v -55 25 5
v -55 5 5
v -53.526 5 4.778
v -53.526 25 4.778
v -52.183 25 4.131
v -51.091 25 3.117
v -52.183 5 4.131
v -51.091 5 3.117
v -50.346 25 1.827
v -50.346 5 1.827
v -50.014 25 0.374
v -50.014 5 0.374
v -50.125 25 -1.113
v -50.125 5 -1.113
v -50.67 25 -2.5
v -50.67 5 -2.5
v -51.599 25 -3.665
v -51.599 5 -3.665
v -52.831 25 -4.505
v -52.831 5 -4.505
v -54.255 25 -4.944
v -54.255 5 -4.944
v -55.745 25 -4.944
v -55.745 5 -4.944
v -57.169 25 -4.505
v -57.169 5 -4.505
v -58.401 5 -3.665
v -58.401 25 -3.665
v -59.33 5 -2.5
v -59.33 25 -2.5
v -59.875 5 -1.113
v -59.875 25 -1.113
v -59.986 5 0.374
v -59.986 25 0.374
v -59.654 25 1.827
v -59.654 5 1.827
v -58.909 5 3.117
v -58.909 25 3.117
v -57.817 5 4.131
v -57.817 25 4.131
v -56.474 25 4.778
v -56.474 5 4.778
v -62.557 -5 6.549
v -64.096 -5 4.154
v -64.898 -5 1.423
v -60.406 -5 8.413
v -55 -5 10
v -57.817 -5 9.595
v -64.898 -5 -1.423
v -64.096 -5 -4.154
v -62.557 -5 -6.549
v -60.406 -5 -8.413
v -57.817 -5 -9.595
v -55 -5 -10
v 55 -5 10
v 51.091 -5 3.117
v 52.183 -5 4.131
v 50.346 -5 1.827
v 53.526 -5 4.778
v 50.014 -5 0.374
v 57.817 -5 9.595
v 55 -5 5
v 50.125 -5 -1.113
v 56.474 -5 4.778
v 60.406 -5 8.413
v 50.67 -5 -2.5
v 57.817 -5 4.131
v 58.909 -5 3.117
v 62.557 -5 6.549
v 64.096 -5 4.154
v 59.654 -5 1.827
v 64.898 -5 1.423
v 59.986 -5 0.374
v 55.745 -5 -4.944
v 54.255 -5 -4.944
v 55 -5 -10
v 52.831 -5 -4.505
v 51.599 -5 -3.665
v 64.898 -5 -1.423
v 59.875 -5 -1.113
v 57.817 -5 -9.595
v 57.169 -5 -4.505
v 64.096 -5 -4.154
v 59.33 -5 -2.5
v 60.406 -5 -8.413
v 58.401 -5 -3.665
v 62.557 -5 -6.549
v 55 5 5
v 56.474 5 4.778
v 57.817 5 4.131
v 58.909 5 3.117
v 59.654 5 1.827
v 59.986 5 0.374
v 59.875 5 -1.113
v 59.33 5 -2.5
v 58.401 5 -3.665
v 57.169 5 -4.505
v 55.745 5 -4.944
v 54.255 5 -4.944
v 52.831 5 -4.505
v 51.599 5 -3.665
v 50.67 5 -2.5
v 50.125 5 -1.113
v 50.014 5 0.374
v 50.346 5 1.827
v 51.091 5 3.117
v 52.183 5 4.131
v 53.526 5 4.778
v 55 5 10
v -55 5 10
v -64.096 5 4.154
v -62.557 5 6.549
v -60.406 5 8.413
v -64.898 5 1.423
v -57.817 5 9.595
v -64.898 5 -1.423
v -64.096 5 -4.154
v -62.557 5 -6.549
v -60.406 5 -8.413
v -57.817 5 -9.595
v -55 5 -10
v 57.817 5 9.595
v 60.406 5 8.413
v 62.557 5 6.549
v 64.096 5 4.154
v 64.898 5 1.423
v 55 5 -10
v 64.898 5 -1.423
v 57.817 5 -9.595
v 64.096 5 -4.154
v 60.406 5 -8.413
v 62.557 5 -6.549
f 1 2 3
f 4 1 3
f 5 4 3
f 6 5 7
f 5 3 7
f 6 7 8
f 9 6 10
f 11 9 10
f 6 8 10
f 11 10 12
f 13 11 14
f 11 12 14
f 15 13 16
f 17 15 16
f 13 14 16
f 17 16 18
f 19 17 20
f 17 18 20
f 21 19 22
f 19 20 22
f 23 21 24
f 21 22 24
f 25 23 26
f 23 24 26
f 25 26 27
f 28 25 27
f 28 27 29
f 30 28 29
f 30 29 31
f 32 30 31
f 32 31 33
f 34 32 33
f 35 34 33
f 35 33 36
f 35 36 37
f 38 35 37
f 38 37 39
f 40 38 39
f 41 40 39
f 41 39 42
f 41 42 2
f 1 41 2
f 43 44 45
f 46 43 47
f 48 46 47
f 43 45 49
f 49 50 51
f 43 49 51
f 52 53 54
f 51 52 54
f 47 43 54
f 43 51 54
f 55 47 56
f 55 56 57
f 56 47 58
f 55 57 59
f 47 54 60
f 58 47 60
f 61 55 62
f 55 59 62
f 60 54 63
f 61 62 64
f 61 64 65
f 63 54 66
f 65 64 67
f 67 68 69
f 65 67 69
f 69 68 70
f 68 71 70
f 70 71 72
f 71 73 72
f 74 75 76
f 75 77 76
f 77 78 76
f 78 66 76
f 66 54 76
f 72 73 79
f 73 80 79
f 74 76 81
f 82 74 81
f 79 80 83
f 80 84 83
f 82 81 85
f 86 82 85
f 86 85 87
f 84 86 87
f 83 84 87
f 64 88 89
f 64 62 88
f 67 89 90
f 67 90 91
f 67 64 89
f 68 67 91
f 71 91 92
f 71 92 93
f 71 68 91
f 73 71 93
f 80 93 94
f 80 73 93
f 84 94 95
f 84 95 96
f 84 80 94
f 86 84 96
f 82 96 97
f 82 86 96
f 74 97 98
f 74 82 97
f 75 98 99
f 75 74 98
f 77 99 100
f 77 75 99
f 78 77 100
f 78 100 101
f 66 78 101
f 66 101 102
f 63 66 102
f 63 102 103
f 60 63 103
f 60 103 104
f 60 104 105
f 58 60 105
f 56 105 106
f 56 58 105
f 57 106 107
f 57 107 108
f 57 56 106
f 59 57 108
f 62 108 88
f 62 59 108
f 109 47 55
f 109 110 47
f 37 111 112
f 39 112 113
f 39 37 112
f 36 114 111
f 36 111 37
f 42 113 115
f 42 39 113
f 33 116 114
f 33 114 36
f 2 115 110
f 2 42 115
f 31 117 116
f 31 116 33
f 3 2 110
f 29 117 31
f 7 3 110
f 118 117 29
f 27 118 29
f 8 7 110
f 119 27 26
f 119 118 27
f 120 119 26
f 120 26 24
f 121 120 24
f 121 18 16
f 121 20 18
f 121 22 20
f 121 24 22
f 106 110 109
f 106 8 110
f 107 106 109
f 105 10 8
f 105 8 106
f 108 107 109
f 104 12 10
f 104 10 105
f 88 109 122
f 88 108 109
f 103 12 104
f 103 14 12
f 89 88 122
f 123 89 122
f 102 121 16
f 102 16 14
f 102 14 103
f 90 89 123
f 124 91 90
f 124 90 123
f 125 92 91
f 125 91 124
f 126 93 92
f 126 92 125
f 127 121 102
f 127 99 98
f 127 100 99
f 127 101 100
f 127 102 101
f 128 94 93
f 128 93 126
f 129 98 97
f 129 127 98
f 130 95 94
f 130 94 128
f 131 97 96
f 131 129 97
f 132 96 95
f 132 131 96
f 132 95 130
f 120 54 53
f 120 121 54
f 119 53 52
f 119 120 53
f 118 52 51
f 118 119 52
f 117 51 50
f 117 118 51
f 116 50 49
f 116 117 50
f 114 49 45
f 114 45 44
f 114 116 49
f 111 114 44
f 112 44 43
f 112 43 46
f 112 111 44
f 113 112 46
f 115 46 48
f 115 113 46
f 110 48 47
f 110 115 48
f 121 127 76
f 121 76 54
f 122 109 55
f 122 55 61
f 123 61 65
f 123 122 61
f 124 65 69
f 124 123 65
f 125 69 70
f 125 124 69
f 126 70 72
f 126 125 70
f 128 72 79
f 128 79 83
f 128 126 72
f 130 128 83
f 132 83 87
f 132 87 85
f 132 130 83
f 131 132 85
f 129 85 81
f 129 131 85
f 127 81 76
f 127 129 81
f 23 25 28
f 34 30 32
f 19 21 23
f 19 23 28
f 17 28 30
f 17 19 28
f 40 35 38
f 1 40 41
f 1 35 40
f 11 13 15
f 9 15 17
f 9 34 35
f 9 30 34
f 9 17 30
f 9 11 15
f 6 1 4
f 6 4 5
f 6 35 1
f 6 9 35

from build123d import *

# Parameters (mm, degrees)
SKETCH1_R                = 5
BOSS_EXTRUDE1_DEPTH      = 5
BOSS_EXTRUDE2_DEPTH      = 25
BOSS_EXTRUDE2_DEPTH_BACK = 5
SKETCH2_R                = 5


with BuildPart() as part:
    # Sketch1 → Boss-Extrude1 (new, symmetric)
    with BuildSketch(Plane(origin=(0, 0, 0), x_dir=(1, 0, 0), z_dir=(0, 1, 0))):
        with BuildLine():
            Line((-55, -10), (55, -10))
            ThreePointArc((55, -10), (65, 0), (55, 10))
            Line((55, 10), (-55, 10))
            ThreePointArc((-55, 10), (-65, 0), (-55, -10))
        make_face()
        with Locations(Location((-55, 0, 0), (0, 0, 270))):
            Circle(SKETCH1_R, mode=Mode.SUBTRACT)
        with Locations(Location((55, 0, 0), (0, 0, 270))):
            Circle(SKETCH1_R, mode=Mode.SUBTRACT)
    extrude(amount=BOSS_EXTRUDE1_DEPTH, both=True)

    # Sketch2 → Boss-Extrude2 (add, two sides: drawn at the far end of the back side and taken through both)
    with BuildSketch(Plane(origin=(0, 0, 0), x_dir=(1, 0, 0), z_dir=(0, 1, 0)).offset(-BOSS_EXTRUDE2_DEPTH_BACK)):
        with Locations(Location((-55, 0, 0), (0, 0, 270))):
            Circle(SKETCH2_R)
    extrude(amount=BOSS_EXTRUDE2_DEPTH + BOSS_EXTRUDE2_DEPTH_BACK)


solid = part.part
